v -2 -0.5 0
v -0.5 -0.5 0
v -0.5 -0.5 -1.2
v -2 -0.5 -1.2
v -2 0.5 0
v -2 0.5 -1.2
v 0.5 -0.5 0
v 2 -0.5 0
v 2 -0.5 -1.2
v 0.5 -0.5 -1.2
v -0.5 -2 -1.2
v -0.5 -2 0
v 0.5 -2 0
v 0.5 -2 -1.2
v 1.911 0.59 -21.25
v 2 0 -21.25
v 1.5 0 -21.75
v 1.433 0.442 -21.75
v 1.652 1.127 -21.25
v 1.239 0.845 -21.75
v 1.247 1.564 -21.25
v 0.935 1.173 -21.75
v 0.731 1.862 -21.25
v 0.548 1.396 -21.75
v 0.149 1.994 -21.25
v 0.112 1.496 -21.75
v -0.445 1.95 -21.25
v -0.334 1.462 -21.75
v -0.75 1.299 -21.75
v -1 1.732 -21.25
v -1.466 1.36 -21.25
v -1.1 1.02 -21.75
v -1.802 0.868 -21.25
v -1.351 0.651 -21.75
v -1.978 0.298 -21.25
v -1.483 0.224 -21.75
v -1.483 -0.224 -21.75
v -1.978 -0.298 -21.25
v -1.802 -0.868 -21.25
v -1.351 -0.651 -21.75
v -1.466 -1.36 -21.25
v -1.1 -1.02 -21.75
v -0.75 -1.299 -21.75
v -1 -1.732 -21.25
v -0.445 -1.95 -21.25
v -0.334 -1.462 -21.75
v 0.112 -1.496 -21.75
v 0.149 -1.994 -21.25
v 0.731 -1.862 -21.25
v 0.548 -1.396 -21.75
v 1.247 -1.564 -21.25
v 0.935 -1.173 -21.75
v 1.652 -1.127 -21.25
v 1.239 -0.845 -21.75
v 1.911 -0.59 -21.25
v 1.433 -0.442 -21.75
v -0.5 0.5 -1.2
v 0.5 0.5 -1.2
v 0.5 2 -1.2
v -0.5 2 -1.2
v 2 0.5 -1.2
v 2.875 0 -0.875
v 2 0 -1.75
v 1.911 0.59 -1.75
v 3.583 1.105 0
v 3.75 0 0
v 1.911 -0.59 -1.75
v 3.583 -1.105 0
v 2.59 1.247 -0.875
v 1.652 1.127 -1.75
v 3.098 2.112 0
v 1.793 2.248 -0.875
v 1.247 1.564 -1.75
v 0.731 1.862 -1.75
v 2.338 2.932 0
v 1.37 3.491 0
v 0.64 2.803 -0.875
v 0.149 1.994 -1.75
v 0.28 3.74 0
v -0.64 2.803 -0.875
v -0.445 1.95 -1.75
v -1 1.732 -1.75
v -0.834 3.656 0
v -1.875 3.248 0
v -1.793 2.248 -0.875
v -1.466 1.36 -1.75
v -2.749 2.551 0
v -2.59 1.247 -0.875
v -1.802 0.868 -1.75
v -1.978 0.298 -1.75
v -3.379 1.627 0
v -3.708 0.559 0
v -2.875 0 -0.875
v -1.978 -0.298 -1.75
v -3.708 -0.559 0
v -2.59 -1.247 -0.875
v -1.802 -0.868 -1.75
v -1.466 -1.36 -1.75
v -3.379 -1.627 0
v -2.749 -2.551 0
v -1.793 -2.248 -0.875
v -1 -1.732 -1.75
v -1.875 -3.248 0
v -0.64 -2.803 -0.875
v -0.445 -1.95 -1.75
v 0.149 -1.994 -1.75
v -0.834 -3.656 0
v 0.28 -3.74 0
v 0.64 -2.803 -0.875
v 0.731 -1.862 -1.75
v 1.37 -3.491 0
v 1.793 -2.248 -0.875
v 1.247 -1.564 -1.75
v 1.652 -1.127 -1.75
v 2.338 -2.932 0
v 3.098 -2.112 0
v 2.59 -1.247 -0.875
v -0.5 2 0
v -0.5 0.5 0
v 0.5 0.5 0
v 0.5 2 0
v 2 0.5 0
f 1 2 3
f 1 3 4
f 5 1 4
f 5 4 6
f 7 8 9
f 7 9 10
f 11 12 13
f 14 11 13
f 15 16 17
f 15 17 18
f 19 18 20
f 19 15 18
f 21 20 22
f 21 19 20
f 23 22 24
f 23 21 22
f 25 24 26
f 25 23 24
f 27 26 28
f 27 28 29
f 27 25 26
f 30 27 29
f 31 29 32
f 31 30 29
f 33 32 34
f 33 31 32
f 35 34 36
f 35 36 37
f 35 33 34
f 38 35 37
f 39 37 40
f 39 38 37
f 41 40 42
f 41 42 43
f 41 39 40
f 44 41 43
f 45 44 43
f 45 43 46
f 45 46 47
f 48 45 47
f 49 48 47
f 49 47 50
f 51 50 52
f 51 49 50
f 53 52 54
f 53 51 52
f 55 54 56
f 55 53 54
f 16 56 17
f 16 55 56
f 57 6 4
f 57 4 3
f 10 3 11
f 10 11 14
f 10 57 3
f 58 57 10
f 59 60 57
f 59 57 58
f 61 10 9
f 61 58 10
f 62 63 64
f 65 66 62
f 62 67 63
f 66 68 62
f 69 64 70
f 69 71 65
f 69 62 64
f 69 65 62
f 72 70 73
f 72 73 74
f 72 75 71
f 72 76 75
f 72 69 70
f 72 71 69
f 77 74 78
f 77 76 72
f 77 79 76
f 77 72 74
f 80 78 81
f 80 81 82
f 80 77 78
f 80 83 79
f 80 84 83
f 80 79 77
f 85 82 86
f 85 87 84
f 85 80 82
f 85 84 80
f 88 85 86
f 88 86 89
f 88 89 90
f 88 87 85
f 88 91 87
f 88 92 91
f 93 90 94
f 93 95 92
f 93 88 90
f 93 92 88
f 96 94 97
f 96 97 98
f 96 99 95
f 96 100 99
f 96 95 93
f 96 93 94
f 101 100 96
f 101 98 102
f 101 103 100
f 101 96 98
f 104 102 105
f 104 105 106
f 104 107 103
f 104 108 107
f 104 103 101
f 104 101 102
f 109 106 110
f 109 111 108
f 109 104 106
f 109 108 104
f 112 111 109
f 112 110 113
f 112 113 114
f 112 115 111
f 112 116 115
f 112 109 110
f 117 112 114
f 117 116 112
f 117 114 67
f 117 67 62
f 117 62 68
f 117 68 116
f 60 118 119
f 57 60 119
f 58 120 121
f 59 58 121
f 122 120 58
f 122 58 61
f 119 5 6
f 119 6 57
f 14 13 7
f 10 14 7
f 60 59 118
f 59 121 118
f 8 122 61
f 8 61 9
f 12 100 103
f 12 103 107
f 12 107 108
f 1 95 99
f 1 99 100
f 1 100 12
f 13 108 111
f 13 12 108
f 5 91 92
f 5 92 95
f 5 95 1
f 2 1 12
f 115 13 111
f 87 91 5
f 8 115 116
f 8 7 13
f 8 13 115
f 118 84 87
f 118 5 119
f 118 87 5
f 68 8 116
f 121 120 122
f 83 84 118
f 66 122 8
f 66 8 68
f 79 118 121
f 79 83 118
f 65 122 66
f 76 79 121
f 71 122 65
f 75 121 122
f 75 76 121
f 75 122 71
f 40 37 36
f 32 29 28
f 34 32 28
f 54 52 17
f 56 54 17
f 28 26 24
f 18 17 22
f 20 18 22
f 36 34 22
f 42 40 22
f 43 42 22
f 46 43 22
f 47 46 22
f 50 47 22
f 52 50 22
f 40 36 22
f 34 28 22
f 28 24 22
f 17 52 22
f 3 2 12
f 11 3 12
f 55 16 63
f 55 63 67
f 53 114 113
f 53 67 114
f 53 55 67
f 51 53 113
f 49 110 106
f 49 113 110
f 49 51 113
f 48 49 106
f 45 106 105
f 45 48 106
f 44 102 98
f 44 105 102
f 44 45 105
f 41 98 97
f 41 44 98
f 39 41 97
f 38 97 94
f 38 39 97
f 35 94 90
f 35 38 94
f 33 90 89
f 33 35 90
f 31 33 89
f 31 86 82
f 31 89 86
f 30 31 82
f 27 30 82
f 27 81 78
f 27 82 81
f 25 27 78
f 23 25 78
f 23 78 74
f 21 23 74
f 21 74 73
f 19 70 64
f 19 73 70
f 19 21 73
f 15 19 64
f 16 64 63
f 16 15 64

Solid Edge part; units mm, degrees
sketch "Sketch1" plane through (0, 0, 0) normal (0, -1, 0) x (1, 0, 0)
  line L0 (0, 0) -> (3.75, 0)
  line L1 (3.75, 0) -> (2, -1.75)
  line L2 (2, -1.75) -> (2, -21.75)
  line L3 (2, -21.75) -> (0, -21.75)
  dimension "D1" = 20
revolve "RevolvedProtrusion1" add sketch "Sketch1" angle 360 about axis through (0, 0, -21.75) along (0, 0, 1)
chamfer "Chamfer_1" distance 0.5 angle 45 1 edges at (-2, 0, -21.75)
sketch "Sketch2" plane through (0, 0, 0) normal (0, 0, 1) x (0, 1, 0)
  line L0 (0.5, -0.5) -> (2, -0.5)
  line L1 (2, -0.5) -> (2, 0.5)
  line L2 (2, 0.5) -> (0.5, 0.5)
  line L3 (0.5, 2) -> (0.5, 0.5)
  line L4 (-0.5, 2) -> (0.5, 2)
  line L5 (-0.5, 0.5) -> (-0.5, 2)
  line L6 (-0.5, 0.5) -> (-2, 0.5)
  line L7 (-2, 0.5) -> (-2, -0.5)
  line L8 (-2, -0.5) -> (-0.5, -0.5)
  line L9 (-0.5, -2) -> (-0.5, -0.5)
  line L10 (0.5, -2) -> (-0.5, -2)
  line L11 (0.5, -0.5) -> (0.5, -2)
  dimension "D1" = 4
  dimension "D2" = 1
extrude "ExtrudedCutout_1" cut sketch "Sketch2" against normal blind 1.2
cosmetic_thread "Thread1" size "M4"
properties material "Stainless steel"
